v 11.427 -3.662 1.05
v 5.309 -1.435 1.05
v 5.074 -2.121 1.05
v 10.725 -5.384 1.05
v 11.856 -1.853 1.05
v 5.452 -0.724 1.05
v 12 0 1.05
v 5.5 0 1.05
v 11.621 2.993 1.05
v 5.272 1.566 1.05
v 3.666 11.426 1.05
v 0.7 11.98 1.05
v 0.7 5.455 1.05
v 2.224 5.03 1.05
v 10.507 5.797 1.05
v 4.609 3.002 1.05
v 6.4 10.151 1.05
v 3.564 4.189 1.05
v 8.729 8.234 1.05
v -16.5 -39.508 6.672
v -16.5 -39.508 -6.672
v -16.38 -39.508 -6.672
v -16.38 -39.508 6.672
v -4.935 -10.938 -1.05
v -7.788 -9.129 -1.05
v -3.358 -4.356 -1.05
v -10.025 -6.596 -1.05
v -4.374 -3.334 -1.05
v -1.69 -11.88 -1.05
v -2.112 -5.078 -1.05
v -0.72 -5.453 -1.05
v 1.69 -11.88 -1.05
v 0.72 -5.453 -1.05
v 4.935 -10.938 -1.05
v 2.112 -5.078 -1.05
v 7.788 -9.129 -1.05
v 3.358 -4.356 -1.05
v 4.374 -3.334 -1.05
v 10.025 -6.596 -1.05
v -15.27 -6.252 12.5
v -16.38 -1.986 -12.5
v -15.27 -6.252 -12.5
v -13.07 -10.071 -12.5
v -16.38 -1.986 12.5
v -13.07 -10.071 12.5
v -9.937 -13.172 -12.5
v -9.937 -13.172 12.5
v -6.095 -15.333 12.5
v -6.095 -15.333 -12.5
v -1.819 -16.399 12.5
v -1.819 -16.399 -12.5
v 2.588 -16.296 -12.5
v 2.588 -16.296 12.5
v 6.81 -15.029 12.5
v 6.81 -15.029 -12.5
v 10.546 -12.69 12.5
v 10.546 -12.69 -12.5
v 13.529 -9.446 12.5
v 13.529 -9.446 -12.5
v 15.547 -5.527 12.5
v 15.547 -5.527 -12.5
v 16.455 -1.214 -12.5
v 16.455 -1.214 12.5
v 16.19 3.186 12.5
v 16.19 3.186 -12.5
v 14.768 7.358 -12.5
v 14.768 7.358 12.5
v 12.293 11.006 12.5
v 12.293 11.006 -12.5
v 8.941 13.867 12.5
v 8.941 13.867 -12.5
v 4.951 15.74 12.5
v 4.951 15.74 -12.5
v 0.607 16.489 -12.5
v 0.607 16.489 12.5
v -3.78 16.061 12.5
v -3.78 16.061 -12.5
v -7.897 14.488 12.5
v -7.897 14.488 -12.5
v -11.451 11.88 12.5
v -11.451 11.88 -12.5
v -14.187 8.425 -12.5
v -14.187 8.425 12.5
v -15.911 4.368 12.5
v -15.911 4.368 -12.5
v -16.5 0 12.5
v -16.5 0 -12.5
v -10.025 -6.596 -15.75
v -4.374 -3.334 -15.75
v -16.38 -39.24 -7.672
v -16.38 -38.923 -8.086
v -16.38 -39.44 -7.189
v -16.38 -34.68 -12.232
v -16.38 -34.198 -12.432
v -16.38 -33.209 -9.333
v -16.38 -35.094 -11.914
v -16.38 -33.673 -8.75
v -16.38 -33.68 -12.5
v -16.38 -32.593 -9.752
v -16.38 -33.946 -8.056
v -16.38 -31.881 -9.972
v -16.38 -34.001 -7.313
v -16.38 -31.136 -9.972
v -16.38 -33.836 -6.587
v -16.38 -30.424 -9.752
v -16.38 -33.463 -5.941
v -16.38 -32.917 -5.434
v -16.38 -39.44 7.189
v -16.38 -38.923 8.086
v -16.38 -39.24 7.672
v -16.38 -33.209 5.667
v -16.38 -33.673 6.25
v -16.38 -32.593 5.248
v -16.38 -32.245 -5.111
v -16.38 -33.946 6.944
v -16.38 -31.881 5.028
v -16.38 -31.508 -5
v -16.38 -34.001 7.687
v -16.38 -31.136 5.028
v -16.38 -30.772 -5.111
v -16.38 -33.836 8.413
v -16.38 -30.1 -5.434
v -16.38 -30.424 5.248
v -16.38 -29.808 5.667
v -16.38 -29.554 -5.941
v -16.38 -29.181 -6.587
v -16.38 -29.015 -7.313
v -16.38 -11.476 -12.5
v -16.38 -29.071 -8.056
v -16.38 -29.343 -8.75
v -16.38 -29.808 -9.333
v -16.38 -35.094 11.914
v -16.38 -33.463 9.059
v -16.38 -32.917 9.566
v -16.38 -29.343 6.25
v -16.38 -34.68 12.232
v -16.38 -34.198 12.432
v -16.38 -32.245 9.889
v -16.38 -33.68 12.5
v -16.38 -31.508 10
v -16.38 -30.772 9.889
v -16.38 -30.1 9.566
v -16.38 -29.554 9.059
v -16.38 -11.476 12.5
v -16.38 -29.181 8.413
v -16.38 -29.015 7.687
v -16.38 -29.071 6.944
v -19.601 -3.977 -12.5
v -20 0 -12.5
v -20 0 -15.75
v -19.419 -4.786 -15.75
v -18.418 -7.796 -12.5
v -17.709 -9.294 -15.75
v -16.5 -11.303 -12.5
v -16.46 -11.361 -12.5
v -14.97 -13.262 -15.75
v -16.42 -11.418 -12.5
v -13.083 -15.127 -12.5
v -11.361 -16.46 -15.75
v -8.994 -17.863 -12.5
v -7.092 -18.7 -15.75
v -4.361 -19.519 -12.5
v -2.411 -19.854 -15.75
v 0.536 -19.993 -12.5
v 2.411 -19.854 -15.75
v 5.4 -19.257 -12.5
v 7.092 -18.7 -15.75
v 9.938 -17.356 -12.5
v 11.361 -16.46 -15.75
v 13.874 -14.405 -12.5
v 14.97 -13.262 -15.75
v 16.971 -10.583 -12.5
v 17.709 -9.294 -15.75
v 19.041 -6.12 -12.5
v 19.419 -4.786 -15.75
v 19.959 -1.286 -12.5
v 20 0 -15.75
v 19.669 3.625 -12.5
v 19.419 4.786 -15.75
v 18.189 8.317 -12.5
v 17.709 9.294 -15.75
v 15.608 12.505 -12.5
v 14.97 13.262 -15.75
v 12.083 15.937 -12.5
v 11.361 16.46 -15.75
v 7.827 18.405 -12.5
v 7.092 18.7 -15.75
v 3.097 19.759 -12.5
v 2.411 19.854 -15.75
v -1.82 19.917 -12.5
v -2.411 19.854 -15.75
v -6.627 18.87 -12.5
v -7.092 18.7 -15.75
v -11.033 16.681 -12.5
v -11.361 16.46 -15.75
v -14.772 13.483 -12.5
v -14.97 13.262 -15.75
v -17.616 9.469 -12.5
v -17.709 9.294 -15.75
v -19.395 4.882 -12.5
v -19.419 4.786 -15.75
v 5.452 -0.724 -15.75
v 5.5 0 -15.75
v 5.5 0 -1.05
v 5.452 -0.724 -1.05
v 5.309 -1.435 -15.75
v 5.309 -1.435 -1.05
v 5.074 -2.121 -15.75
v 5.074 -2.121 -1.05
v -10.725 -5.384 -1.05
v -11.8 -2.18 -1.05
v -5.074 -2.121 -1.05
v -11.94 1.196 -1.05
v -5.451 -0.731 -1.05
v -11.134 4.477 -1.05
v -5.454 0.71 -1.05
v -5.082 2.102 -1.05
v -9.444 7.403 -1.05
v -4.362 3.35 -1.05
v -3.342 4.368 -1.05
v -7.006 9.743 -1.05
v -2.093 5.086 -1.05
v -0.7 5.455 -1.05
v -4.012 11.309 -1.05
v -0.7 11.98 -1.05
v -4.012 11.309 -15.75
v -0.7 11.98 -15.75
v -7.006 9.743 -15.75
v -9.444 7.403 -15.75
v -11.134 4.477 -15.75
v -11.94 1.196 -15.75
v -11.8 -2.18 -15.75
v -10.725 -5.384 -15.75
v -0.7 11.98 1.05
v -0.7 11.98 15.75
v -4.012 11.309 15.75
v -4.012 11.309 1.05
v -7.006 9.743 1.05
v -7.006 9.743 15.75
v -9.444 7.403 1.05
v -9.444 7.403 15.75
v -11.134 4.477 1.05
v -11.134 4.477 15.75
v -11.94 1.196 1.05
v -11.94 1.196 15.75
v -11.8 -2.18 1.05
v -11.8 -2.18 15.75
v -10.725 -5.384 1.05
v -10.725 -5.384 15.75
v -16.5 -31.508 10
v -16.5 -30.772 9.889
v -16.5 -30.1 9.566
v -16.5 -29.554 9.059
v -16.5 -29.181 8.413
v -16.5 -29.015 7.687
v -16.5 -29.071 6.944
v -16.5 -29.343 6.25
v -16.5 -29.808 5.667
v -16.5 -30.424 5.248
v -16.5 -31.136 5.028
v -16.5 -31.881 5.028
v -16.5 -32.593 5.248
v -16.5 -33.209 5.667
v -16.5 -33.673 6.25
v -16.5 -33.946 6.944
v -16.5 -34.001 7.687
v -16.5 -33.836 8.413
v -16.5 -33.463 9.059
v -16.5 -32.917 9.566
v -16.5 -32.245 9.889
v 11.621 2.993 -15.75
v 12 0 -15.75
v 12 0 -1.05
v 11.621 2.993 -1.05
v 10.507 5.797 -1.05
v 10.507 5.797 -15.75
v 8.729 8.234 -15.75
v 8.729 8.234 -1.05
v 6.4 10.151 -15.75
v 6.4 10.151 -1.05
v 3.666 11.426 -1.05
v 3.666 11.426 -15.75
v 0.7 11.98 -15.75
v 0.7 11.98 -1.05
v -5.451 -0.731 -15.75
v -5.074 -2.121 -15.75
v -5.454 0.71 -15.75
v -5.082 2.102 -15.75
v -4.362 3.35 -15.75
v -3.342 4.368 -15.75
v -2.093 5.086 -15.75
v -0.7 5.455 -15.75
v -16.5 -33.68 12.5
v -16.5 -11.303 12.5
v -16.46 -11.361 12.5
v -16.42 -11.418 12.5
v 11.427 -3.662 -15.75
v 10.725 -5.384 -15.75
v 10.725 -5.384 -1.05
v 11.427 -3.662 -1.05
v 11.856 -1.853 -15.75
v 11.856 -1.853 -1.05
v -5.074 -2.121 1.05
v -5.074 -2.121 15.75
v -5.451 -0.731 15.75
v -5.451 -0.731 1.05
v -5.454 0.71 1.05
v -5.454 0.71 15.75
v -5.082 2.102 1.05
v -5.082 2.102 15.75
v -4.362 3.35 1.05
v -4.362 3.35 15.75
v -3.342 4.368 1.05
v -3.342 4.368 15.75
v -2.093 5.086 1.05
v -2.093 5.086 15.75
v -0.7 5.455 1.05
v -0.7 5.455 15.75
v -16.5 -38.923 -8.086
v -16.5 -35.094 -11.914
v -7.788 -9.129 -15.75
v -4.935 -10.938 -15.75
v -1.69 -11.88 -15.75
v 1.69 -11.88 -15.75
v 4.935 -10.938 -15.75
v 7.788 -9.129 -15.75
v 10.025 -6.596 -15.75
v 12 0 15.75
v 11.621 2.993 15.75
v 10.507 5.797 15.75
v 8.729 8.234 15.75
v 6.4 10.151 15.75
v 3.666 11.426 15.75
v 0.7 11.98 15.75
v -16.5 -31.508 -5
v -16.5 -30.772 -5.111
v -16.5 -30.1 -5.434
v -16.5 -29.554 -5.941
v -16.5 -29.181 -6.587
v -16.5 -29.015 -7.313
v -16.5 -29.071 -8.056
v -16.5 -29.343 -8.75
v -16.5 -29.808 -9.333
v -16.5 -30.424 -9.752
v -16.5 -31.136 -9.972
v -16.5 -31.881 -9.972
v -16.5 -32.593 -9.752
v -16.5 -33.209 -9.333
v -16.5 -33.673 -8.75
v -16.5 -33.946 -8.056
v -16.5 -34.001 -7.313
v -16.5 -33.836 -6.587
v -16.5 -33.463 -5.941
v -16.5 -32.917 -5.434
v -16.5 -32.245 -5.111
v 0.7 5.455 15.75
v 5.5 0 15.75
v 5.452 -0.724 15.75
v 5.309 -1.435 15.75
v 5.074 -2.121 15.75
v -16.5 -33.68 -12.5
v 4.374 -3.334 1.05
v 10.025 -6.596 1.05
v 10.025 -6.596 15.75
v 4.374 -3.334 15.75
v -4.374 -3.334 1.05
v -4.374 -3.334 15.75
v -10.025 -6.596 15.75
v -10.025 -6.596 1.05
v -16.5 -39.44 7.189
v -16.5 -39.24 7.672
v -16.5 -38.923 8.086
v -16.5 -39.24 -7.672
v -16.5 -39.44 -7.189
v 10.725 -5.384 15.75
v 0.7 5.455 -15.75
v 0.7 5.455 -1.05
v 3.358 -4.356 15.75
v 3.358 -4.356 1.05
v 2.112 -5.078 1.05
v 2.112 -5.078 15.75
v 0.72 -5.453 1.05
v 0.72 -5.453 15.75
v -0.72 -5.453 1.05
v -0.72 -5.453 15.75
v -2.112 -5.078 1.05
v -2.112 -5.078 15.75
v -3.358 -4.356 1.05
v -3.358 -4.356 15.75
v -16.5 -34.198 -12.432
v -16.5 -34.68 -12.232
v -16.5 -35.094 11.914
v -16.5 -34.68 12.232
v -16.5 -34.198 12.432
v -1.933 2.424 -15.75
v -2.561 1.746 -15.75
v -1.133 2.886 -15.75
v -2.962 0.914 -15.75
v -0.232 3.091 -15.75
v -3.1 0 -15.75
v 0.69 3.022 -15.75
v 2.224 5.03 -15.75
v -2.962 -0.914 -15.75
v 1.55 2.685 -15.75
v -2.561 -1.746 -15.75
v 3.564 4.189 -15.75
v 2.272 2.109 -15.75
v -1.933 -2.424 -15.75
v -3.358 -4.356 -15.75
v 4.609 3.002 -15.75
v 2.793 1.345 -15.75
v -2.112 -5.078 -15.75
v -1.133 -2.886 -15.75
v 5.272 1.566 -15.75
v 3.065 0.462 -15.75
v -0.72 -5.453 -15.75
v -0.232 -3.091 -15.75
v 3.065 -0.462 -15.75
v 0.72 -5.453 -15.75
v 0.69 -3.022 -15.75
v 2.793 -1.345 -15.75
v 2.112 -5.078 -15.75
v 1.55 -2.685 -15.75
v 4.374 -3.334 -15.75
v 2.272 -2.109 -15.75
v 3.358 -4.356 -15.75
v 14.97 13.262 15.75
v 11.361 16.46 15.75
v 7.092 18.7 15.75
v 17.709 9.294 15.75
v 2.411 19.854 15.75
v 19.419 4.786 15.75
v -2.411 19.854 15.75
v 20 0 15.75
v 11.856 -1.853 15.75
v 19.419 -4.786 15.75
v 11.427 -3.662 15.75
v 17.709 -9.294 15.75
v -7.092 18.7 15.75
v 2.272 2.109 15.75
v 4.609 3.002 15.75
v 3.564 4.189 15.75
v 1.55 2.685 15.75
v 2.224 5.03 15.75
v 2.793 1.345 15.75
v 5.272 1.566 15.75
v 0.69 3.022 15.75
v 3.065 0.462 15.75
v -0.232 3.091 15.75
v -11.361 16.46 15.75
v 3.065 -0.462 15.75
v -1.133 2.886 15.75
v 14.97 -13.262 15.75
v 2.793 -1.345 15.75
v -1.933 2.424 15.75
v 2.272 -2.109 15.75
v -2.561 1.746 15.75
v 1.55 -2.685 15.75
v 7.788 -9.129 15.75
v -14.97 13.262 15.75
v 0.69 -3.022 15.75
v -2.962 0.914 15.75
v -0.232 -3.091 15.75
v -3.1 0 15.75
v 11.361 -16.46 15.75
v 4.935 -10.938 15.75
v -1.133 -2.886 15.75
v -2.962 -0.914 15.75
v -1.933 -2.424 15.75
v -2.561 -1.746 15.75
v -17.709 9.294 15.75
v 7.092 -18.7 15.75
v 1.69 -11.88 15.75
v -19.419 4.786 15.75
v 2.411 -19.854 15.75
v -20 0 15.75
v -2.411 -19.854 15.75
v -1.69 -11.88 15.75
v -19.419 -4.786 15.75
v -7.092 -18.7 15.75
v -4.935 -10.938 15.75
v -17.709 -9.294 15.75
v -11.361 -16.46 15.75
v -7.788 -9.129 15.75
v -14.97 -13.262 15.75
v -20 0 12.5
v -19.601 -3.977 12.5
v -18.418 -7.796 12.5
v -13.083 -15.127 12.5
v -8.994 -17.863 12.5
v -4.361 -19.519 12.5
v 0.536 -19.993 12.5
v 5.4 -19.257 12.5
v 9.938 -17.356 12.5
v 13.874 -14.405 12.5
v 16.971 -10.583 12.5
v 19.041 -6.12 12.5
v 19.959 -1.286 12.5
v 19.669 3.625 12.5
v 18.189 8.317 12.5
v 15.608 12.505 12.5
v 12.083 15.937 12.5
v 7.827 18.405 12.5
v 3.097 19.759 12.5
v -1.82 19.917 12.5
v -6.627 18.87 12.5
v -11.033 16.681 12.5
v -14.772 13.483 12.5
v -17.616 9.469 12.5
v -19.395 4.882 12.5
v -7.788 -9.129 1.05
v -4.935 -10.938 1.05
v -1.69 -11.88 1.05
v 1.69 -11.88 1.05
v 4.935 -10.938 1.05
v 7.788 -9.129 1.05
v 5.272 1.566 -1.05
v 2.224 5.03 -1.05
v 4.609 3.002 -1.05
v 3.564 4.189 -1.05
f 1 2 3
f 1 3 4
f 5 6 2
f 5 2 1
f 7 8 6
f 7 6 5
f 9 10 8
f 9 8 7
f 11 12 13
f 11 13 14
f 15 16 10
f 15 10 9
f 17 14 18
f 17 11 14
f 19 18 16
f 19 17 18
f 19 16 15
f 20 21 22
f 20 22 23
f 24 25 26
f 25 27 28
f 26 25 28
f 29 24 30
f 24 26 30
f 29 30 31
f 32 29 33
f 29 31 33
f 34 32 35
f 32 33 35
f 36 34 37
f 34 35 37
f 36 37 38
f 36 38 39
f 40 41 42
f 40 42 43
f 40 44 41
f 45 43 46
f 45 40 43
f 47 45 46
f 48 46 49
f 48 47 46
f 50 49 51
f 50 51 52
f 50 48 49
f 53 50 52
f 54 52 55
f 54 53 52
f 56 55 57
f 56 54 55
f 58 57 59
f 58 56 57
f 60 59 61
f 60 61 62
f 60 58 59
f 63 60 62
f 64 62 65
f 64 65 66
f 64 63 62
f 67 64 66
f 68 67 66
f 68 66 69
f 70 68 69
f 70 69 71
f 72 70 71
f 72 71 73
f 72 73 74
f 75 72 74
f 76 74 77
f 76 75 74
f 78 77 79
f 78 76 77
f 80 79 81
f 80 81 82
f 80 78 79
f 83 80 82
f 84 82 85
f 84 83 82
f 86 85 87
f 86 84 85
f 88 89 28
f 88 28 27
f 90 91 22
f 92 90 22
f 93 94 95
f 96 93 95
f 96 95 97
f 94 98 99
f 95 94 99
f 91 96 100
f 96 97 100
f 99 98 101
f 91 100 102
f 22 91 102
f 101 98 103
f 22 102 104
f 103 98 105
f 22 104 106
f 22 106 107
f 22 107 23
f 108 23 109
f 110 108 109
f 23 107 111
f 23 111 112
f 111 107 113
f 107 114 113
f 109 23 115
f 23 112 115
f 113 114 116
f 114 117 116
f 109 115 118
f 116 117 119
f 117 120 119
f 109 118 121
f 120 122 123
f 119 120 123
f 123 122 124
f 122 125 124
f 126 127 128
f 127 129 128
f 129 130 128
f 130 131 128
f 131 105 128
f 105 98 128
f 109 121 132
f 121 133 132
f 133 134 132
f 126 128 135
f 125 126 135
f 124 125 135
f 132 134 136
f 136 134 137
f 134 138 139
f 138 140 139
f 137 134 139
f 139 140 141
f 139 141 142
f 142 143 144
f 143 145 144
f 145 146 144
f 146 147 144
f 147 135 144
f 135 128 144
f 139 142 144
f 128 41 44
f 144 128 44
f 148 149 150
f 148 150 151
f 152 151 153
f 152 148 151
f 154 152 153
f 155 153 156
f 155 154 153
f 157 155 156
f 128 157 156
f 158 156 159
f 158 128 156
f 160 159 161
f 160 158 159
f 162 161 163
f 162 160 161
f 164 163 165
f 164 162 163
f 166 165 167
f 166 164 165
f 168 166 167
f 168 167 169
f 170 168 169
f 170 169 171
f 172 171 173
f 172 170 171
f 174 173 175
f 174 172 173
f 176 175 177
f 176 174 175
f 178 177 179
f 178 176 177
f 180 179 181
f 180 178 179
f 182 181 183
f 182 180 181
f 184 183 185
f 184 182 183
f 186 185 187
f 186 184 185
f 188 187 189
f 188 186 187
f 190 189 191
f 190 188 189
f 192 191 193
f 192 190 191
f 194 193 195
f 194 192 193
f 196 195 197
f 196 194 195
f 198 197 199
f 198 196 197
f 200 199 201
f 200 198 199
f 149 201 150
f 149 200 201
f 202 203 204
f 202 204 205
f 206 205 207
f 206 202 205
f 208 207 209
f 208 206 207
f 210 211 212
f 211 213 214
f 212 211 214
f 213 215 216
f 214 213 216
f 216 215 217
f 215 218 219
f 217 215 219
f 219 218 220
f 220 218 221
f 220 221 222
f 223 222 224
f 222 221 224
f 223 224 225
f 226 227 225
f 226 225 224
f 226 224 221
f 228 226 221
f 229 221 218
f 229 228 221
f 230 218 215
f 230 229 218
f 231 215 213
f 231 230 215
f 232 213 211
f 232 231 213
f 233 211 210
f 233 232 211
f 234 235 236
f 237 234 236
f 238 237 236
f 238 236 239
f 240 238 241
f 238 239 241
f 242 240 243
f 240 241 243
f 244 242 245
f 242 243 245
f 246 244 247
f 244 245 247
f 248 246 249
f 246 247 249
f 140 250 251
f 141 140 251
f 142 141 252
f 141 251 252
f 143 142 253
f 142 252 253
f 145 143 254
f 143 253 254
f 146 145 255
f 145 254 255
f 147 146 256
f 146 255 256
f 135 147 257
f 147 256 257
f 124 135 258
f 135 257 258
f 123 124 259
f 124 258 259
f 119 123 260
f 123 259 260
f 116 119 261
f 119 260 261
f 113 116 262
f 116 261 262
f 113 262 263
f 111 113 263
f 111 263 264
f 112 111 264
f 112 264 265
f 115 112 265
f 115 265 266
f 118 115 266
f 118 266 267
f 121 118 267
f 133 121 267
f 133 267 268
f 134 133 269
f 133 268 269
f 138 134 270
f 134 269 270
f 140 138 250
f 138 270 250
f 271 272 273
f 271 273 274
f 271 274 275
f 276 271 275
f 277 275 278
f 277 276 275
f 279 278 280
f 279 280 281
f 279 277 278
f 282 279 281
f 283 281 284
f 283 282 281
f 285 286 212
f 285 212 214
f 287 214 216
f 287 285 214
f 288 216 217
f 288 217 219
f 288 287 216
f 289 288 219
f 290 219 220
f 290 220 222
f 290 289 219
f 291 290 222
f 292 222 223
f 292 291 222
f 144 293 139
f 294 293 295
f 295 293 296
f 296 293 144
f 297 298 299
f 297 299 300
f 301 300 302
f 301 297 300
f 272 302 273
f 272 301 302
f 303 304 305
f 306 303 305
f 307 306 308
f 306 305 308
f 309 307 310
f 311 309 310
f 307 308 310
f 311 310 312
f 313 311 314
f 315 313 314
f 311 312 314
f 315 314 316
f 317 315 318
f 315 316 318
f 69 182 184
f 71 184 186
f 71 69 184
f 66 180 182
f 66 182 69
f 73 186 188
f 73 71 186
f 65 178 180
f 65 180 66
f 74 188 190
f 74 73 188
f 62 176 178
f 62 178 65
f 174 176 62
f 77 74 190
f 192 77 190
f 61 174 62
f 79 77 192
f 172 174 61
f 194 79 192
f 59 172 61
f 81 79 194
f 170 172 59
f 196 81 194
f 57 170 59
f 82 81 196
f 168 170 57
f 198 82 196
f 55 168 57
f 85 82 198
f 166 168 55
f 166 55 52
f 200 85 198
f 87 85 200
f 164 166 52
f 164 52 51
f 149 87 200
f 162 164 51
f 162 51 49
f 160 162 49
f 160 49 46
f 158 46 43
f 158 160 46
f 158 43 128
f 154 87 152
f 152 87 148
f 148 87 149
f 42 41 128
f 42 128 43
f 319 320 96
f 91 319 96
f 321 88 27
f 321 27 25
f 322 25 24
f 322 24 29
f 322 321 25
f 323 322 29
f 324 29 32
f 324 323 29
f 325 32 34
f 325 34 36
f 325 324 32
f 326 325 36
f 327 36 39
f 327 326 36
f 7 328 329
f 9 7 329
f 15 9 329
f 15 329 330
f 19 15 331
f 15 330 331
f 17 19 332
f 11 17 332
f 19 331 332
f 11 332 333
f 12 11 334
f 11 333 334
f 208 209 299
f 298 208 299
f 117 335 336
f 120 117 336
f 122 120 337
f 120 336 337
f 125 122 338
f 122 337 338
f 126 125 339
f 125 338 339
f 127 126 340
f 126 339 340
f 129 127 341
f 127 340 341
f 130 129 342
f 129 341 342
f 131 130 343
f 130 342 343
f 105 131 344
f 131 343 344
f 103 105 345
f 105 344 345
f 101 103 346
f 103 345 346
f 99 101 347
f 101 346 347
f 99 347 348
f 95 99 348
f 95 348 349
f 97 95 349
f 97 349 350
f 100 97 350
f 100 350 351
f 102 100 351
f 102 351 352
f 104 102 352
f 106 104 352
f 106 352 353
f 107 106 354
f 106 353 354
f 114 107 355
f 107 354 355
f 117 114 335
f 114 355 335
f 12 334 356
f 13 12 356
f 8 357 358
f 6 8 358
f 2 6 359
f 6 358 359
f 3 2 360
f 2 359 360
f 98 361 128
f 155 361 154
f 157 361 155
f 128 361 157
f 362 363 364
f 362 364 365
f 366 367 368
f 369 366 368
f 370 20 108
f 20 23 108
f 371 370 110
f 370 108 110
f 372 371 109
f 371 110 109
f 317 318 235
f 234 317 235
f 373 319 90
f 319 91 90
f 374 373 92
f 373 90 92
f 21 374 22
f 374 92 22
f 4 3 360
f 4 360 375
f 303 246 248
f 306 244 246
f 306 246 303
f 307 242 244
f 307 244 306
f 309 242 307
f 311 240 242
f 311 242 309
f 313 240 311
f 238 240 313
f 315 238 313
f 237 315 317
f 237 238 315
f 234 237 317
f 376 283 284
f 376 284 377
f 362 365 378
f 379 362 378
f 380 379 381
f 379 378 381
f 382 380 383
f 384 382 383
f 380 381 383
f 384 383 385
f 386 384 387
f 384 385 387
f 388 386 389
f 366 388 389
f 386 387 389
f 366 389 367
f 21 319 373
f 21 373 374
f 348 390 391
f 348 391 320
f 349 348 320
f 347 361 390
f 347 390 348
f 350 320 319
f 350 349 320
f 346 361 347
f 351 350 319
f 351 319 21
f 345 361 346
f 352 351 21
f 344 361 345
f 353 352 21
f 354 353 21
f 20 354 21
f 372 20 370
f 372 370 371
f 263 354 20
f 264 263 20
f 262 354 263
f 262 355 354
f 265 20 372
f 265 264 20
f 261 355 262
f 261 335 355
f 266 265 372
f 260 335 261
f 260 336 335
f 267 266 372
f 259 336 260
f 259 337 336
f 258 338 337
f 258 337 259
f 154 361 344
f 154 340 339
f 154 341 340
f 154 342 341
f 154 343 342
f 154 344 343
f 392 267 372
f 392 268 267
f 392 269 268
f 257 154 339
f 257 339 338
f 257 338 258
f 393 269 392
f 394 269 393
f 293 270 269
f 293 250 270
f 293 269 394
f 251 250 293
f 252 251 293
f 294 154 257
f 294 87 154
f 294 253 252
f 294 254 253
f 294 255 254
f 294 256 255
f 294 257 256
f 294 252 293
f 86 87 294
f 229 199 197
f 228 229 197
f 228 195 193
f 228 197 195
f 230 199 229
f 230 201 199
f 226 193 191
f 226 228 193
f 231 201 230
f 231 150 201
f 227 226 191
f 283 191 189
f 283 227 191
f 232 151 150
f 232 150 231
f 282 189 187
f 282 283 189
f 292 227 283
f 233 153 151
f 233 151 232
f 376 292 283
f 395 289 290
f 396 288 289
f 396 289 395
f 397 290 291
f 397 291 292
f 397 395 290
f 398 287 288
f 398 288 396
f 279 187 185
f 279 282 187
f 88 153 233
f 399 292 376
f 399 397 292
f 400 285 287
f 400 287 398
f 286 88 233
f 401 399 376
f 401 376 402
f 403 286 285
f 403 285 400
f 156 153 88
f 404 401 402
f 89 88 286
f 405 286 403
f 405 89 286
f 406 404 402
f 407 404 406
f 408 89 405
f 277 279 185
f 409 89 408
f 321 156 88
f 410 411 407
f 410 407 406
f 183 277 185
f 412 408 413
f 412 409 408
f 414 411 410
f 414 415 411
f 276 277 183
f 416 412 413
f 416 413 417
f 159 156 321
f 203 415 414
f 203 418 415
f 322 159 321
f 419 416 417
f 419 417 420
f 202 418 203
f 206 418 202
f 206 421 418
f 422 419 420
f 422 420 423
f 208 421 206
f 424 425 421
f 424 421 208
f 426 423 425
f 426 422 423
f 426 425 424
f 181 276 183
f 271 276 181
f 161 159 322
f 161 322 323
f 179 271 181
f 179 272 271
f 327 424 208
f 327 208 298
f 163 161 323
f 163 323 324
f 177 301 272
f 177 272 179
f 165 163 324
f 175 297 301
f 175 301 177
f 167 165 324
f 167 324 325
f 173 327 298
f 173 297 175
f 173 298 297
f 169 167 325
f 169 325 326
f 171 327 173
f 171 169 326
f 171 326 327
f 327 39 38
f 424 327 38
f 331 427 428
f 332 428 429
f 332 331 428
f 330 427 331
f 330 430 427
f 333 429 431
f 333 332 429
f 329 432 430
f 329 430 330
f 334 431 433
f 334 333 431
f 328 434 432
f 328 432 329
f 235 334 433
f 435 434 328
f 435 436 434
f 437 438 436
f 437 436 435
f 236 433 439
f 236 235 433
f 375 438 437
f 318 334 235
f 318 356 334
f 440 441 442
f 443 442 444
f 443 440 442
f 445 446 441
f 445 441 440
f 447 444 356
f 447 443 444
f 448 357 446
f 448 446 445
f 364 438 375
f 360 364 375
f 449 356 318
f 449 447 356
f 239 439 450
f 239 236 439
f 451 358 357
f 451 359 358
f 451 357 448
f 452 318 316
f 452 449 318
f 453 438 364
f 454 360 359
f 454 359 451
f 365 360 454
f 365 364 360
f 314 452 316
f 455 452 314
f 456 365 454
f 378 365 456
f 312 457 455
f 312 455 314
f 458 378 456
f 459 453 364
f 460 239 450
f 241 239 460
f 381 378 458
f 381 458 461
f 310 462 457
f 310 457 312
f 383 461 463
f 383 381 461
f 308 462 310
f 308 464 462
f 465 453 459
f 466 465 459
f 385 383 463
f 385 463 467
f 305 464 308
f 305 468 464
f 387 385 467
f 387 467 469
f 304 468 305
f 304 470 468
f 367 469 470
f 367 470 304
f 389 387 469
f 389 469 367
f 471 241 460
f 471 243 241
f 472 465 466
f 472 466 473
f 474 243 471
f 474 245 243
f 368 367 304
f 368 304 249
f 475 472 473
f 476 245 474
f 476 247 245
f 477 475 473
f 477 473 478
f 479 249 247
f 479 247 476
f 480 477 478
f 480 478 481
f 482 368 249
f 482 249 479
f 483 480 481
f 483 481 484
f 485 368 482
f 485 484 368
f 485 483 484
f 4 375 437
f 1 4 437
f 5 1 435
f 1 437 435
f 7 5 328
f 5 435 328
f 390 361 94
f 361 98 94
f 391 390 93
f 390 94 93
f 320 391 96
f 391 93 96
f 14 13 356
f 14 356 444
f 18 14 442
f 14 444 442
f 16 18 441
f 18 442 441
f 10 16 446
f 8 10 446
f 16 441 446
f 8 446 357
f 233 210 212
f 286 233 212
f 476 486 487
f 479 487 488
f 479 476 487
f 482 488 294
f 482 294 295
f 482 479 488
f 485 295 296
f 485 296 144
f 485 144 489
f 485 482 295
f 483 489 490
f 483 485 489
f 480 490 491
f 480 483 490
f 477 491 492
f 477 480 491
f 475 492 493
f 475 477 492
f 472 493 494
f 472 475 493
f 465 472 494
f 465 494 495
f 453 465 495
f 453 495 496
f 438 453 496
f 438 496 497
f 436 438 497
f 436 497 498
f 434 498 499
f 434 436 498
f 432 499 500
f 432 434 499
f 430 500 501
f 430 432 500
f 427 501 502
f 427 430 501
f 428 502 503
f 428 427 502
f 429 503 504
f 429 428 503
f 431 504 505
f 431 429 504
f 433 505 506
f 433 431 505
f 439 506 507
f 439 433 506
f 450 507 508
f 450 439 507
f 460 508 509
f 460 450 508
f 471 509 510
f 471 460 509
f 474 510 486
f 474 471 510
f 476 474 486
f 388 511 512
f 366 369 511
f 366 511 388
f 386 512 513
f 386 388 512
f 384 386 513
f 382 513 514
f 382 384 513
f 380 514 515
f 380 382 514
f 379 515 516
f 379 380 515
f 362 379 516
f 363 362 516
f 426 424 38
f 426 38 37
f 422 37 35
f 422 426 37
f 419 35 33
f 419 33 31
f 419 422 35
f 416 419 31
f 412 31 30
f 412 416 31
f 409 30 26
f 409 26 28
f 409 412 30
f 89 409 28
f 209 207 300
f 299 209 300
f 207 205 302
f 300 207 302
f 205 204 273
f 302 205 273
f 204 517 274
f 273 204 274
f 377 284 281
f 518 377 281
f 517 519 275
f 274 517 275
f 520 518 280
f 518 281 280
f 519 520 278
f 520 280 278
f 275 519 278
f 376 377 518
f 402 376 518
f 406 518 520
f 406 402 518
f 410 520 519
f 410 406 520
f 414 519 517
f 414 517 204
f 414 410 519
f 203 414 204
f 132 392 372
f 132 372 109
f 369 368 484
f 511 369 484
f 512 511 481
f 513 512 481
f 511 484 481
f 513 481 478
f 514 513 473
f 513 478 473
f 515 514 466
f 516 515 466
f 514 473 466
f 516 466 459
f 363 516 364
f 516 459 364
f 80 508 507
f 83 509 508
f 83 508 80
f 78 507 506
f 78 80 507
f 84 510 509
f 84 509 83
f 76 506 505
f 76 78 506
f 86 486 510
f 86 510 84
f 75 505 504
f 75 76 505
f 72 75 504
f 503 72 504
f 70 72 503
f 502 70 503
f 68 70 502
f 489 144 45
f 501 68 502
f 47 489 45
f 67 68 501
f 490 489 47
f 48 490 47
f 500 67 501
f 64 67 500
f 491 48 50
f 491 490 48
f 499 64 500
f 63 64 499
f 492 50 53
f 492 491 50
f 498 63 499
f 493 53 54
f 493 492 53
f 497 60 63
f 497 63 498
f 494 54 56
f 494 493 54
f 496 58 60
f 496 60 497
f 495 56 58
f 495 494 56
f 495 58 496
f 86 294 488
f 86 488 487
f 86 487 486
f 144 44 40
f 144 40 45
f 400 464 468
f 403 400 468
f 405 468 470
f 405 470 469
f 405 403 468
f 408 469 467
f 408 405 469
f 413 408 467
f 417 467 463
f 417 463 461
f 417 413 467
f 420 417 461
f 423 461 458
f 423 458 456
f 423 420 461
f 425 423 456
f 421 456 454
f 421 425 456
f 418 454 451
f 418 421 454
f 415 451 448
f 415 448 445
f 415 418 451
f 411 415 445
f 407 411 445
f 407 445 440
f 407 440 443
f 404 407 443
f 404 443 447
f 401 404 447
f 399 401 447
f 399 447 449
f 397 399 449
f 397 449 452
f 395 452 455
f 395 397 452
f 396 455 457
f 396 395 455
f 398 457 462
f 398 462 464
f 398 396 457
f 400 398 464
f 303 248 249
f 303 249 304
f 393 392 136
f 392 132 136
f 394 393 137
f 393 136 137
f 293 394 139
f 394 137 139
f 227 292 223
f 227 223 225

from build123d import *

# Parameters (mm, degrees)
CUT_EXTRUDE_1_DEPTH = 14.7
SKETCH_4_W          = 25
SKETCH_4_H          = 39.508434057
SKETCH_4_R          = 2.5
EXTRUDE_1_DEPTH     = 0.12
CHAMFER_1_SIZE      = 5
FILLET_1_R          = 2


with BuildPart() as part:
    # 草图2 → 旋转1 (revolve)
    with BuildSketch(Plane(origin=(0, 0, 0), x_dir=(1, 0, 0), z_dir=(0, 1, 0)), mode=Mode.PRIVATE) as revolve_1_sk:
        Polygon((3.1, 15.75), (20, 15.75), (20, 12.5), (16.5, 12.5), (16.5, -12.5), (20, -12.5), (20, -15.75), (3.1, -15.75), align=None)
    revolve(revolve_1_sk.sketch.rotate(Axis((0, 0, -15.75), (0, 0, 1)), 180), axis=Axis((0, 0, -15.75), (0, 0, 1)))

    # 草图3 → 切除-拉伸1 (cut)
    with BuildSketch(Plane.XY.offset(15.75)):
        with BuildLine():
            Line((-0.7, 5.455272679), (-0.7, 11.979565935))
            ThreePointArc((-0.7, 11.979565935), (-10.392304845, 6), (-10.724608426, -5.383565185))
            Line((-10.724608426, -5.383565185), (-5.074404724, -2.121418557))
            ThreePointArc((-5.074404724, -2.121418557), (-4.763139721, 2.75), (-0.7, 5.455272679))
        make_face()
        with BuildLine():
            Line((-4.374404724, -3.333854122), (-10.024608426, -6.59600075))
            ThreePointArc((-10.024608426, -6.59600075), (0, -12), (10.024608426, -6.59600075))
            Line((10.024608426, -6.59600075), (4.374404724, -3.333854122))
            ThreePointArc((4.374404724, -3.333854122), (0, -5.5), (-4.374404724, -3.333854122))
        make_face()
        with BuildLine():
            ThreePointArc((12, 0), (8.729261137, 8.23407554), (0.7, 11.979565935))
            Line((0.7, 11.979565935), (0.7, 5.455272679))
            ThreePointArc((0.7, 5.455272679), (4.129164564, 3.633180425), (5.5, 0))
            ThreePointArc((5.5, 0), (5.392551622, -1.081844262), (5.074404724, -2.121418557))
            Line((5.074404724, -2.121418557), (10.724608426, -5.383565185))
            ThreePointArc((10.724608426, -5.383565185), (11.676799671, -2.766288026), (12, 0))
        make_face()
    cut_extrude_1 = extrude(amount=-CUT_EXTRUDE_1_DEPTH, mode=Mode.SUBTRACT)

    # 镜向2: 切除-拉伸1 across plane
    add(cut_extrude_1.mirror(Plane.XY), mode=Mode.SUBTRACT)

    # 草图4 → 凸台-拉伸1 (add)
    with BuildSketch(Plane.ZY.offset(16.5)):
        with Locations((0, -19.754217029)):
            Rectangle(SKETCH_4_W, SKETCH_4_H)
        with Locations((7.5, -31.508434057)):
            Circle(SKETCH_4_R, mode=Mode.SUBTRACT)
        with Locations((-7.5, -31.508434057)):
            Circle(SKETCH_4_R, mode=Mode.SUBTRACT)
    extrude(amount=-EXTRUDE_1_DEPTH)

    # 倒角1
    chamfer_1_edges = [part.edges().sort_by_distance(p)[0] for p in [
        (-16.44, -39.508434057, 12.5),
        (-16.44, -39.508434057, -12.5),
    ]]
    chamfer(chamfer_1_edges, length=CHAMFER_1_SIZE)

    # 圆角1
    fillet_1_edges = [part.edges().sort_by_distance(p)[0] for p in [
        (-16.44, -34.508434057, -12.5),
        (-16.44, -39.508434057, 7.5),
        (-16.44, -39.508434057, -7.5),
        (-16.44, -34.508434057, 12.5),
    ]]
    fillet(fillet_1_edges, radius=FILLET_1_R)


solid = part.part
